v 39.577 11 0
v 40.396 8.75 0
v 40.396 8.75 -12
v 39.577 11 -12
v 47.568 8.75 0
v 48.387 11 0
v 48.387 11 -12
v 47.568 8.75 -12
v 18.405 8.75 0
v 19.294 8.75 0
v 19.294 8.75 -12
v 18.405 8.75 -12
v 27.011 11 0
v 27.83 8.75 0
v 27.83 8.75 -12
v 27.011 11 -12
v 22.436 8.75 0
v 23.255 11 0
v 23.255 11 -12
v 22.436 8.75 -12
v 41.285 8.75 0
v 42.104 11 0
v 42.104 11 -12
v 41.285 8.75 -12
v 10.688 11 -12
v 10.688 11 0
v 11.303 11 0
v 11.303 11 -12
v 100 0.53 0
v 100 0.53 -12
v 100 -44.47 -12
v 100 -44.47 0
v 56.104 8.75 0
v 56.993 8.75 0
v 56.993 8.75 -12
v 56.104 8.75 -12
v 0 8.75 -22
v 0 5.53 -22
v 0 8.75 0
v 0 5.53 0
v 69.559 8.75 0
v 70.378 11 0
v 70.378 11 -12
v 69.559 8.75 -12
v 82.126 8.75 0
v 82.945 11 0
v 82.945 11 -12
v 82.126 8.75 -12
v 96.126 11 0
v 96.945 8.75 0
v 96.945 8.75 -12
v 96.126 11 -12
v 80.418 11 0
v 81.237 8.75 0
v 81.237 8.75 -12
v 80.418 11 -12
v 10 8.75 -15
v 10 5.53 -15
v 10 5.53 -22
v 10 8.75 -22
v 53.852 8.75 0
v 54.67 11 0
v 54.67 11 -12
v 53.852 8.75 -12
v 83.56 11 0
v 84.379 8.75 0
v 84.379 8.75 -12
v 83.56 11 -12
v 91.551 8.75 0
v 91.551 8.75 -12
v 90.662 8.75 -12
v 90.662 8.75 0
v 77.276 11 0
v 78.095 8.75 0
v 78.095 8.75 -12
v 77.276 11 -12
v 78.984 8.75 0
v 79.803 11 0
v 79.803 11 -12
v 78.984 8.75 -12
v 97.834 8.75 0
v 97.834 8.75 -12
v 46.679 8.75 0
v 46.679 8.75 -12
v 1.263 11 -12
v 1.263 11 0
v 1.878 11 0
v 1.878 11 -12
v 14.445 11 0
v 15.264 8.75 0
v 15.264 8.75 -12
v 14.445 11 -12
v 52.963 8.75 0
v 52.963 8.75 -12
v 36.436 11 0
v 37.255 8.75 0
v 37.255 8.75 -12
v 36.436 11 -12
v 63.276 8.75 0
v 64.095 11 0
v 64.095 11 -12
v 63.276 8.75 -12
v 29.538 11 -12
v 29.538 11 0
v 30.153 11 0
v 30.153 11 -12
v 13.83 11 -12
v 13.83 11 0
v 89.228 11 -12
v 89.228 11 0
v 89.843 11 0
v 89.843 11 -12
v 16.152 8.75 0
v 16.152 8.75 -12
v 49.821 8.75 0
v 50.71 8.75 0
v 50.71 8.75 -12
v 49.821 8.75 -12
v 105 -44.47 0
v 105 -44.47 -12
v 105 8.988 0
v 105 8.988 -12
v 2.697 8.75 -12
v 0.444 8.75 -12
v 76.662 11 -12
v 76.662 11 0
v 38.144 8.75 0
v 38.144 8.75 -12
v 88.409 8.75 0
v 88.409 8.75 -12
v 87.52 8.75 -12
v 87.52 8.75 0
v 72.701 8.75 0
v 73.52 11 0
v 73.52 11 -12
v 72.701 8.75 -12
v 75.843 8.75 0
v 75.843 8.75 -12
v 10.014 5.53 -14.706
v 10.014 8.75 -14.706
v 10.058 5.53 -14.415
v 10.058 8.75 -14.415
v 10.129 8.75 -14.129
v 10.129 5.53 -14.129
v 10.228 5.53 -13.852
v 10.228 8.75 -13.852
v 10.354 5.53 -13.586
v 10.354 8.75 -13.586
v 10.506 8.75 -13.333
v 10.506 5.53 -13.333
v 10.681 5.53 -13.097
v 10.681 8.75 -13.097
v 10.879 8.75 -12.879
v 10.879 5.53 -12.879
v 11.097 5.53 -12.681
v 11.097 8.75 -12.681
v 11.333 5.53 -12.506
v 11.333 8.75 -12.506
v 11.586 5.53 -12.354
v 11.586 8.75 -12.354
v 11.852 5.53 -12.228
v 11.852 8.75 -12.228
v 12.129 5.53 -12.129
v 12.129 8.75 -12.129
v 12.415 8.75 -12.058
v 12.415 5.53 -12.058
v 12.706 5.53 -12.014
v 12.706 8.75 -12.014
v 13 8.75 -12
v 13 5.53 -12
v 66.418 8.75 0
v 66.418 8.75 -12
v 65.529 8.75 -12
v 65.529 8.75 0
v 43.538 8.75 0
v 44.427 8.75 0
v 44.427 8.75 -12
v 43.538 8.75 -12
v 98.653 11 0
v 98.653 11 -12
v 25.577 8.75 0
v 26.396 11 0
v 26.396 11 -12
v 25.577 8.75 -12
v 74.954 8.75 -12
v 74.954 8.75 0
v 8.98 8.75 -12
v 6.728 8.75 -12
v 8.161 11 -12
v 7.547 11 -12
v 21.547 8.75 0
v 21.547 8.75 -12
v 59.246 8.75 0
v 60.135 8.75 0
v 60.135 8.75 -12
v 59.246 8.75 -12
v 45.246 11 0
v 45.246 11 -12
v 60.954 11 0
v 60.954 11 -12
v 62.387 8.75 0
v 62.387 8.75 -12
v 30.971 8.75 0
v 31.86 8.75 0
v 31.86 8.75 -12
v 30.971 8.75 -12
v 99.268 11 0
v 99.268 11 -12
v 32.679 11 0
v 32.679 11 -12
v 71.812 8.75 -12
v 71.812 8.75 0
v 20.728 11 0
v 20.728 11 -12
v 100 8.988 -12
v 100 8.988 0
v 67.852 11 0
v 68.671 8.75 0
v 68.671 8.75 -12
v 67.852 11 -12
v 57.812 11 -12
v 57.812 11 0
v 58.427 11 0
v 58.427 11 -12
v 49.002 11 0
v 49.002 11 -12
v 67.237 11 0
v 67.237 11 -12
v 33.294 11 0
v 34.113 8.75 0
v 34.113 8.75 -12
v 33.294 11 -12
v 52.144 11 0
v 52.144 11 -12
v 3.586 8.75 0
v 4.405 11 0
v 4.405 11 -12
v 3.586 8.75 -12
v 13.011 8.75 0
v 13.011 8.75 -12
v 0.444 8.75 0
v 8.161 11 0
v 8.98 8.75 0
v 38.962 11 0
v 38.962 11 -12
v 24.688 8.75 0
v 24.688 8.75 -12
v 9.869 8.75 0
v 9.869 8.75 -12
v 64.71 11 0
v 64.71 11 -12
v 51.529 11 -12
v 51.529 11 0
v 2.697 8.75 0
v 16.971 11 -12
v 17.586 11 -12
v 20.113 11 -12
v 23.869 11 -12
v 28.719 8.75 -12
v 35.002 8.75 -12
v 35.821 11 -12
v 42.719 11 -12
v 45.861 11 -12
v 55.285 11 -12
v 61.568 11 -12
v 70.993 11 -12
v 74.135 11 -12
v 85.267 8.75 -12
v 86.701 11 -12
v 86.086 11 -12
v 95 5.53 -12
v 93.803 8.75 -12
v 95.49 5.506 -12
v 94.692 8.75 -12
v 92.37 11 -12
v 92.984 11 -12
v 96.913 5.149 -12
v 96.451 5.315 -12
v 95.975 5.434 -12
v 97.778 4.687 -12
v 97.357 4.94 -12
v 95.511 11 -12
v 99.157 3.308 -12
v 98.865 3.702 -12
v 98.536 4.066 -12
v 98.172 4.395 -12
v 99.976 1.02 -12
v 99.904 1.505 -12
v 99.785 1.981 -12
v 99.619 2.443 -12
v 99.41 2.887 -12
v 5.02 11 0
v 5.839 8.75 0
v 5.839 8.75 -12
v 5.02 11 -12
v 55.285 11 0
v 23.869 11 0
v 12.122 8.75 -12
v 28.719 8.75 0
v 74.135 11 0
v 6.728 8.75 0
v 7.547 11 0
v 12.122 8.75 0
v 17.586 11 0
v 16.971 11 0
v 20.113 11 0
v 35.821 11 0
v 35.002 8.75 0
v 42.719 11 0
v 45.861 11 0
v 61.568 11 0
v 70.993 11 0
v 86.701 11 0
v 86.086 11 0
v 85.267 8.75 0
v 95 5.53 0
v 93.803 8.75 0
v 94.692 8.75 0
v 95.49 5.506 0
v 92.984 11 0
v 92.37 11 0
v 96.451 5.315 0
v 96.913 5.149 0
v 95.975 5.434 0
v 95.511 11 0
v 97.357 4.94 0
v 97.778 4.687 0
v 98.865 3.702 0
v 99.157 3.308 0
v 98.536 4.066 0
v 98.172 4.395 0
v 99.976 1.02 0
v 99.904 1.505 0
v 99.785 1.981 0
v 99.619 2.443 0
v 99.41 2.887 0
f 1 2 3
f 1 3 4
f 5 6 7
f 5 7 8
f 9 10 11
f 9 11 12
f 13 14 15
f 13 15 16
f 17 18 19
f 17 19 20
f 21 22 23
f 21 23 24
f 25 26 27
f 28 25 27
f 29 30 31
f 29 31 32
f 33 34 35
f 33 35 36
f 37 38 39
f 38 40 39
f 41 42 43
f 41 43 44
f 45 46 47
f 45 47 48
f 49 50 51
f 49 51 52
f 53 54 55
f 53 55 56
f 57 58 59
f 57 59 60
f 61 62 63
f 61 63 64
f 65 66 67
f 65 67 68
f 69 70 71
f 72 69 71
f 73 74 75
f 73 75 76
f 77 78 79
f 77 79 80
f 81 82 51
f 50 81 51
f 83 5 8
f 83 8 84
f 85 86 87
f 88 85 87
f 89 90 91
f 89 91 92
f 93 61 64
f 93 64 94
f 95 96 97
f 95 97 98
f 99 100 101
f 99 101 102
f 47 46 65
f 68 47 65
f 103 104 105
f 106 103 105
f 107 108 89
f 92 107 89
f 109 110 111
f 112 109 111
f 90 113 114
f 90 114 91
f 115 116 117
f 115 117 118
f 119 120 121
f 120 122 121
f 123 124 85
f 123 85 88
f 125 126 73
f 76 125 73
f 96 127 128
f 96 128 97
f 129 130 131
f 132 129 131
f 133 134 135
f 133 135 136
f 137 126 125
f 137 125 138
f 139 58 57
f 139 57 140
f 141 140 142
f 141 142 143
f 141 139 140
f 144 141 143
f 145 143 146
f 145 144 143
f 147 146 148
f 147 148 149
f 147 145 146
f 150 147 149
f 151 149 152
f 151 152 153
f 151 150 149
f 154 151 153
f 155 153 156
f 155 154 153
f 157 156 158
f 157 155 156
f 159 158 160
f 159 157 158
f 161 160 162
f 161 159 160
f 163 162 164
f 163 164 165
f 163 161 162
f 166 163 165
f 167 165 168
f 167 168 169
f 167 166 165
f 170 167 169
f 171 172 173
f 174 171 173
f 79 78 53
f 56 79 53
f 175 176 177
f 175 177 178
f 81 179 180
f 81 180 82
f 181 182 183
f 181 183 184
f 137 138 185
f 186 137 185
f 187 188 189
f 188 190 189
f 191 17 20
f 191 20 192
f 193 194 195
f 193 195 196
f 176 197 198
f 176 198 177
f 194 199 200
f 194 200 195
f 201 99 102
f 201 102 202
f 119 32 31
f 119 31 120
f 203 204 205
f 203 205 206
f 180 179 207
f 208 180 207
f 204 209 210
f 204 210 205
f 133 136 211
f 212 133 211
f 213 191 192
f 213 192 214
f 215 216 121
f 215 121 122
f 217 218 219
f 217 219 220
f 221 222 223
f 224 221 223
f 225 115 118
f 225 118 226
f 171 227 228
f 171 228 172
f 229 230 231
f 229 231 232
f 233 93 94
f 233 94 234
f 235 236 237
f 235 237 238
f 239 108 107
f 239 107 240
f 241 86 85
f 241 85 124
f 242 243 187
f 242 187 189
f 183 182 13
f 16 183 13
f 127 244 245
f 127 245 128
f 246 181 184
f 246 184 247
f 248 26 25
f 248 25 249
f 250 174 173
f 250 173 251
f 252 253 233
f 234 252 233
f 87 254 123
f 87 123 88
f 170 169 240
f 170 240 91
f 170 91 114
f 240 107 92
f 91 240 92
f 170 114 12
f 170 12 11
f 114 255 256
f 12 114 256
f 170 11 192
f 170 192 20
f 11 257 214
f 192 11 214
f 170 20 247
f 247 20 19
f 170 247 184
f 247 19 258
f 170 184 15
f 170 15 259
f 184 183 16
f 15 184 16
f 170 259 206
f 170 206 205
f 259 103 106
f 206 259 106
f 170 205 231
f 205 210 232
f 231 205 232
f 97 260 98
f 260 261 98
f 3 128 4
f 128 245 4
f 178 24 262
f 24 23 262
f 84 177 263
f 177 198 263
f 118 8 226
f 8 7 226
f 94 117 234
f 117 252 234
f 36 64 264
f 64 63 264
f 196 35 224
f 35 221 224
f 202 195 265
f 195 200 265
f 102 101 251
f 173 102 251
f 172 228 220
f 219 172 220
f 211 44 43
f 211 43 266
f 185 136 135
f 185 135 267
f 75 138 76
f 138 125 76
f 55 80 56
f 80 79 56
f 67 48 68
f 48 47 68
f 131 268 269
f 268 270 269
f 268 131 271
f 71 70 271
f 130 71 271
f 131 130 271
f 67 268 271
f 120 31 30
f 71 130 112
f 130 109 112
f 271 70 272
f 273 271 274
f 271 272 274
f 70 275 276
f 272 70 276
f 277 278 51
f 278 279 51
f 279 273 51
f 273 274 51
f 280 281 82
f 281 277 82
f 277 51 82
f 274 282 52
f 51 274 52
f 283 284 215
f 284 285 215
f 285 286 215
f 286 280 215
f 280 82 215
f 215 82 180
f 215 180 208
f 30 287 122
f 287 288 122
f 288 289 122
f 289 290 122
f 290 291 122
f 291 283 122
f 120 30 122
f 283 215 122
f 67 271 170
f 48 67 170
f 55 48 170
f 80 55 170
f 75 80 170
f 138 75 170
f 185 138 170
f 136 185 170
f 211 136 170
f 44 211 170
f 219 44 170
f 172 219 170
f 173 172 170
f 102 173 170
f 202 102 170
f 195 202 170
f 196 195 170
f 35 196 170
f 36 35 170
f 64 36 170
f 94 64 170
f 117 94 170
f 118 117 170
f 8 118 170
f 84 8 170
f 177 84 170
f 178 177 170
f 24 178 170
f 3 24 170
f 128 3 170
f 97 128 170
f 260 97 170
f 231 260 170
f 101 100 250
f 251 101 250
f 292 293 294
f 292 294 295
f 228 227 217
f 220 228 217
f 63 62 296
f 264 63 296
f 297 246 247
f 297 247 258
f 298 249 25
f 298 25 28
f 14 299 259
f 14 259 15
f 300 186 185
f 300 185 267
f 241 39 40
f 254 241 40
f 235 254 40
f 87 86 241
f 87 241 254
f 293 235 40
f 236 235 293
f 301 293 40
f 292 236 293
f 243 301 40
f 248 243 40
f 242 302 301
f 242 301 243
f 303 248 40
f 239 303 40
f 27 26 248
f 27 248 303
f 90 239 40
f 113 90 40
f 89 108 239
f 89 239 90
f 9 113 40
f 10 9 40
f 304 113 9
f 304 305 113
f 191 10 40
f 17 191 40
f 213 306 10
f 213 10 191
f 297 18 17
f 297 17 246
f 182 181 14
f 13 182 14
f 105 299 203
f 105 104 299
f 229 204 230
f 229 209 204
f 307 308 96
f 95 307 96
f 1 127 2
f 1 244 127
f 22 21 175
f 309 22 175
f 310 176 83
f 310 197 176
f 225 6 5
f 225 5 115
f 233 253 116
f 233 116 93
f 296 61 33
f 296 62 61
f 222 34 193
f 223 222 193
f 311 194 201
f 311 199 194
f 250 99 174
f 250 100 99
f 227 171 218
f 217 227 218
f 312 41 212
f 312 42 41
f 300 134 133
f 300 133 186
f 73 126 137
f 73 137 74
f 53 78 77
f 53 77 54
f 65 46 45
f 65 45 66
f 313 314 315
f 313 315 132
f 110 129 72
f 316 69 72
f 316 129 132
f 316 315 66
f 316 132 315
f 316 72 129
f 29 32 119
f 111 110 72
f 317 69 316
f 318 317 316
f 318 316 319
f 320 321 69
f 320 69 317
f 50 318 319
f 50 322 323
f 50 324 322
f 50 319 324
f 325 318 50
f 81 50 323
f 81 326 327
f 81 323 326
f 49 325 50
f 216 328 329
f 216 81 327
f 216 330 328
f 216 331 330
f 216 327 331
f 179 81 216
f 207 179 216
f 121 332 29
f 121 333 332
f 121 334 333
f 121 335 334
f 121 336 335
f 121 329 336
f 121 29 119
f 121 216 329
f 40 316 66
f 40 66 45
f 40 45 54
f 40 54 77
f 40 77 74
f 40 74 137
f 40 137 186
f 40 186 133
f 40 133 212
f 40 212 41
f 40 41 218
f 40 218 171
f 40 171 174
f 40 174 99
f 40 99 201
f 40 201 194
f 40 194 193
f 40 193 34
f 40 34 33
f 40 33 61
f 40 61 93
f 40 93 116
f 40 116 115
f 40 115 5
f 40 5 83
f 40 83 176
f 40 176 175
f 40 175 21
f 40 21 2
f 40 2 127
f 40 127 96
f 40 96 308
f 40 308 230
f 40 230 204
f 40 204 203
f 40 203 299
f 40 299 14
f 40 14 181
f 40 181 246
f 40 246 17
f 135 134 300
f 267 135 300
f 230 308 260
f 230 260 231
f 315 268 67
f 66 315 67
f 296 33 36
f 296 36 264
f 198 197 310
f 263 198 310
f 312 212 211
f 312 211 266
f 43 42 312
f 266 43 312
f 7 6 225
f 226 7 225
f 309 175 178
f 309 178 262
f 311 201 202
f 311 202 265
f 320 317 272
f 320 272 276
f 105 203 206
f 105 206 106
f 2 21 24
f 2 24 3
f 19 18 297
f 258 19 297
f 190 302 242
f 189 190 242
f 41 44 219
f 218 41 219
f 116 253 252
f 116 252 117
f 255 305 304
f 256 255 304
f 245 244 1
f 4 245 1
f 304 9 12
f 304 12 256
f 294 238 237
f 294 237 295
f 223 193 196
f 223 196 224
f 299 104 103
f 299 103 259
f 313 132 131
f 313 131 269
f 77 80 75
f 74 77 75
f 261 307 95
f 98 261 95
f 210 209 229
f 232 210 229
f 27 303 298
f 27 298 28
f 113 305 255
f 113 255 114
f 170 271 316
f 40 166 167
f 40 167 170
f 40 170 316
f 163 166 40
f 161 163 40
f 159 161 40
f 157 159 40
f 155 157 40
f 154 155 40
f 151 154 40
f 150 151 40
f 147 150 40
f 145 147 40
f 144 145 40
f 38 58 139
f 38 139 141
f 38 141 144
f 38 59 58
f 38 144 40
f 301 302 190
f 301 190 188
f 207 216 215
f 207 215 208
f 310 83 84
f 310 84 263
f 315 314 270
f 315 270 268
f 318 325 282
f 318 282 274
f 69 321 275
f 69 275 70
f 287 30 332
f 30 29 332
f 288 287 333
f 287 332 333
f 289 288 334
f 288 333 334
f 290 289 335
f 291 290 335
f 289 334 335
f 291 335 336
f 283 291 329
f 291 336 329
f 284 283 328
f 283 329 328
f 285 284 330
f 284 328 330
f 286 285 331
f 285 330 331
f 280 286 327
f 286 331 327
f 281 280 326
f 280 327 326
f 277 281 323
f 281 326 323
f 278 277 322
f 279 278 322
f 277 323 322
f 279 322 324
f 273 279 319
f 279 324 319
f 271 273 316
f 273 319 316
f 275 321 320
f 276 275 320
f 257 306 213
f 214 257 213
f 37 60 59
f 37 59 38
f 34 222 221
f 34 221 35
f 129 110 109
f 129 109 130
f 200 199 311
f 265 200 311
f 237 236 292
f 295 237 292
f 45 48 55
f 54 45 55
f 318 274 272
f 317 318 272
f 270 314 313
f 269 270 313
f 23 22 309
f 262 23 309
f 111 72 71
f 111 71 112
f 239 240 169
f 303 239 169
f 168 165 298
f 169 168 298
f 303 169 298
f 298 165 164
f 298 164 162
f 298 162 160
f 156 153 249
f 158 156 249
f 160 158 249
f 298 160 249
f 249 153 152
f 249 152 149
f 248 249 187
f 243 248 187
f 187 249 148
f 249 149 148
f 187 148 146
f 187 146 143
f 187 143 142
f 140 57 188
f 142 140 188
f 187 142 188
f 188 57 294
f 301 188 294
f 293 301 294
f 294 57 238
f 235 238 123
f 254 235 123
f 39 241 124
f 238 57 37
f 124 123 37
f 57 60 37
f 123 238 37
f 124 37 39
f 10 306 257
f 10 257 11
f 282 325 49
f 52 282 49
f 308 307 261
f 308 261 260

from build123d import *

# Parameters (mm, degrees)
BLANKSKE_W          = 100
BLANKSKE_H          = 11
BLANK_DEPTH         = 12
TOOTHCUTSIM_DEPTH   = 102.316336294
TEETHCUTS_COUNT     = 33
TEETHCUTS_PITCH     = 3.14159265
SKETCH1_W           = 12
SKETCH1_H           = 5.53
CUT_EXTRUDE1_DEPTH  = 126
SKETCH2_W           = 12
SKETCH2_H           = 3.457737656
BOSS_EXTRUDE1_DEPTH = 5
SKETCH3_W           = 5
SKETCH3_H           = 12
BOSS_EXTRUDE2_DEPTH = 50
FILLET1_R           = 5
SKETCH4_W           = 10
SKETCH4_H           = 3.22
BOSS_EXTRUDE3_DEPTH = 10
FILLET2_R           = 3


with BuildPart() as part:
    # BlankSke → Blank (new body)
    with BuildSketch(Plane.XY):
        with Locations((50, 5.5)):
            Rectangle(BLANKSKE_W, BLANKSKE_H)
    extrude(amount=-BLANK_DEPTH)

    # TooCutSkeSim → ToothCutSim (cut, through all)
    with BuildSketch(Plane.XY):
        Polygon((0.44443537, 8.75), (-0.44443537, 8.75), (-1.272613241, 11.0254), (1.272613241, 11.0254), align=None)
    toothcutsim = extrude(amount=-TOOTHCUTSIM_DEPTH, mode=Mode.SUBTRACT)

    # TeethCuts: ToothCutSim ×33
    with Locations(*[(i * TEETHCUTS_PITCH, 0, 0) for i in range(1, TEETHCUTS_COUNT)]):
        add(toothcutsim, mode=Mode.SUBTRACT)

    # Sketch1 → Cut-Extrude1 (cut)
    with BuildSketch(Plane(origin=(100, 0, 0), x_dir=(0, 0, -1), z_dir=(1, 0, 0))):
        with Locations((6, 2.765)):
            Rectangle(SKETCH1_W, SKETCH1_H)
    extrude(amount=-CUT_EXTRUDE1_DEPTH, mode=Mode.SUBTRACT)

    # Sketch2 → Boss-Extrude1 (add)
    with BuildSketch(Plane(origin=(100, 0, 0), x_dir=(0, 0, -1), z_dir=(1, 0, 0))):
        with Locations((6, 7.258868828)):
            Rectangle(SKETCH2_W, SKETCH2_H)
    extrude(amount=BOSS_EXTRUDE1_DEPTH)

    # Sketch3 → Boss-Extrude2 (add)
    with BuildSketch(Plane.XZ.offset(-5.53)):
        with Locations((102.5, -6)):
            Rectangle(SKETCH3_W, SKETCH3_H)
    extrude(amount=BOSS_EXTRUDE2_DEPTH)

    # Fillet1
    fillet1_edges = [part.edges().sort_by_distance(p)[0] for p in [
        (100, 5.53, -6),
    ]]
    fillet(fillet1_edges, radius=FILLET1_R)

    # Sketch4 → Boss-Extrude3 (add)
    with BuildSketch(Plane(origin=(0, 0, -12), x_dir=(-1, 0, 0), z_dir=(0, 0, -1))):
        with Locations((-5, 7.14)):
            Rectangle(SKETCH4_W, SKETCH4_H)
    extrude(amount=BOSS_EXTRUDE3_DEPTH)

    # Fillet2
    # the kernel refuses this fillet: 3 mm, written as the material it adds along each edge
    with BuildSketch(Plane(origin=(10, 5.53, -12), x_dir=(1, 0, 0), z_dir=(0, 1, 0))) as fillet2_piece_1:
        with BuildLine():
            CenterArc((FILLET2_R, FILLET2_R), FILLET2_R, 180, 90)
            Line((0, FILLET2_R), (0, 0))
            Line((0, 0), (FILLET2_R, 0))
        make_face()
    extrude(amount=3.22)


solid = part.part
